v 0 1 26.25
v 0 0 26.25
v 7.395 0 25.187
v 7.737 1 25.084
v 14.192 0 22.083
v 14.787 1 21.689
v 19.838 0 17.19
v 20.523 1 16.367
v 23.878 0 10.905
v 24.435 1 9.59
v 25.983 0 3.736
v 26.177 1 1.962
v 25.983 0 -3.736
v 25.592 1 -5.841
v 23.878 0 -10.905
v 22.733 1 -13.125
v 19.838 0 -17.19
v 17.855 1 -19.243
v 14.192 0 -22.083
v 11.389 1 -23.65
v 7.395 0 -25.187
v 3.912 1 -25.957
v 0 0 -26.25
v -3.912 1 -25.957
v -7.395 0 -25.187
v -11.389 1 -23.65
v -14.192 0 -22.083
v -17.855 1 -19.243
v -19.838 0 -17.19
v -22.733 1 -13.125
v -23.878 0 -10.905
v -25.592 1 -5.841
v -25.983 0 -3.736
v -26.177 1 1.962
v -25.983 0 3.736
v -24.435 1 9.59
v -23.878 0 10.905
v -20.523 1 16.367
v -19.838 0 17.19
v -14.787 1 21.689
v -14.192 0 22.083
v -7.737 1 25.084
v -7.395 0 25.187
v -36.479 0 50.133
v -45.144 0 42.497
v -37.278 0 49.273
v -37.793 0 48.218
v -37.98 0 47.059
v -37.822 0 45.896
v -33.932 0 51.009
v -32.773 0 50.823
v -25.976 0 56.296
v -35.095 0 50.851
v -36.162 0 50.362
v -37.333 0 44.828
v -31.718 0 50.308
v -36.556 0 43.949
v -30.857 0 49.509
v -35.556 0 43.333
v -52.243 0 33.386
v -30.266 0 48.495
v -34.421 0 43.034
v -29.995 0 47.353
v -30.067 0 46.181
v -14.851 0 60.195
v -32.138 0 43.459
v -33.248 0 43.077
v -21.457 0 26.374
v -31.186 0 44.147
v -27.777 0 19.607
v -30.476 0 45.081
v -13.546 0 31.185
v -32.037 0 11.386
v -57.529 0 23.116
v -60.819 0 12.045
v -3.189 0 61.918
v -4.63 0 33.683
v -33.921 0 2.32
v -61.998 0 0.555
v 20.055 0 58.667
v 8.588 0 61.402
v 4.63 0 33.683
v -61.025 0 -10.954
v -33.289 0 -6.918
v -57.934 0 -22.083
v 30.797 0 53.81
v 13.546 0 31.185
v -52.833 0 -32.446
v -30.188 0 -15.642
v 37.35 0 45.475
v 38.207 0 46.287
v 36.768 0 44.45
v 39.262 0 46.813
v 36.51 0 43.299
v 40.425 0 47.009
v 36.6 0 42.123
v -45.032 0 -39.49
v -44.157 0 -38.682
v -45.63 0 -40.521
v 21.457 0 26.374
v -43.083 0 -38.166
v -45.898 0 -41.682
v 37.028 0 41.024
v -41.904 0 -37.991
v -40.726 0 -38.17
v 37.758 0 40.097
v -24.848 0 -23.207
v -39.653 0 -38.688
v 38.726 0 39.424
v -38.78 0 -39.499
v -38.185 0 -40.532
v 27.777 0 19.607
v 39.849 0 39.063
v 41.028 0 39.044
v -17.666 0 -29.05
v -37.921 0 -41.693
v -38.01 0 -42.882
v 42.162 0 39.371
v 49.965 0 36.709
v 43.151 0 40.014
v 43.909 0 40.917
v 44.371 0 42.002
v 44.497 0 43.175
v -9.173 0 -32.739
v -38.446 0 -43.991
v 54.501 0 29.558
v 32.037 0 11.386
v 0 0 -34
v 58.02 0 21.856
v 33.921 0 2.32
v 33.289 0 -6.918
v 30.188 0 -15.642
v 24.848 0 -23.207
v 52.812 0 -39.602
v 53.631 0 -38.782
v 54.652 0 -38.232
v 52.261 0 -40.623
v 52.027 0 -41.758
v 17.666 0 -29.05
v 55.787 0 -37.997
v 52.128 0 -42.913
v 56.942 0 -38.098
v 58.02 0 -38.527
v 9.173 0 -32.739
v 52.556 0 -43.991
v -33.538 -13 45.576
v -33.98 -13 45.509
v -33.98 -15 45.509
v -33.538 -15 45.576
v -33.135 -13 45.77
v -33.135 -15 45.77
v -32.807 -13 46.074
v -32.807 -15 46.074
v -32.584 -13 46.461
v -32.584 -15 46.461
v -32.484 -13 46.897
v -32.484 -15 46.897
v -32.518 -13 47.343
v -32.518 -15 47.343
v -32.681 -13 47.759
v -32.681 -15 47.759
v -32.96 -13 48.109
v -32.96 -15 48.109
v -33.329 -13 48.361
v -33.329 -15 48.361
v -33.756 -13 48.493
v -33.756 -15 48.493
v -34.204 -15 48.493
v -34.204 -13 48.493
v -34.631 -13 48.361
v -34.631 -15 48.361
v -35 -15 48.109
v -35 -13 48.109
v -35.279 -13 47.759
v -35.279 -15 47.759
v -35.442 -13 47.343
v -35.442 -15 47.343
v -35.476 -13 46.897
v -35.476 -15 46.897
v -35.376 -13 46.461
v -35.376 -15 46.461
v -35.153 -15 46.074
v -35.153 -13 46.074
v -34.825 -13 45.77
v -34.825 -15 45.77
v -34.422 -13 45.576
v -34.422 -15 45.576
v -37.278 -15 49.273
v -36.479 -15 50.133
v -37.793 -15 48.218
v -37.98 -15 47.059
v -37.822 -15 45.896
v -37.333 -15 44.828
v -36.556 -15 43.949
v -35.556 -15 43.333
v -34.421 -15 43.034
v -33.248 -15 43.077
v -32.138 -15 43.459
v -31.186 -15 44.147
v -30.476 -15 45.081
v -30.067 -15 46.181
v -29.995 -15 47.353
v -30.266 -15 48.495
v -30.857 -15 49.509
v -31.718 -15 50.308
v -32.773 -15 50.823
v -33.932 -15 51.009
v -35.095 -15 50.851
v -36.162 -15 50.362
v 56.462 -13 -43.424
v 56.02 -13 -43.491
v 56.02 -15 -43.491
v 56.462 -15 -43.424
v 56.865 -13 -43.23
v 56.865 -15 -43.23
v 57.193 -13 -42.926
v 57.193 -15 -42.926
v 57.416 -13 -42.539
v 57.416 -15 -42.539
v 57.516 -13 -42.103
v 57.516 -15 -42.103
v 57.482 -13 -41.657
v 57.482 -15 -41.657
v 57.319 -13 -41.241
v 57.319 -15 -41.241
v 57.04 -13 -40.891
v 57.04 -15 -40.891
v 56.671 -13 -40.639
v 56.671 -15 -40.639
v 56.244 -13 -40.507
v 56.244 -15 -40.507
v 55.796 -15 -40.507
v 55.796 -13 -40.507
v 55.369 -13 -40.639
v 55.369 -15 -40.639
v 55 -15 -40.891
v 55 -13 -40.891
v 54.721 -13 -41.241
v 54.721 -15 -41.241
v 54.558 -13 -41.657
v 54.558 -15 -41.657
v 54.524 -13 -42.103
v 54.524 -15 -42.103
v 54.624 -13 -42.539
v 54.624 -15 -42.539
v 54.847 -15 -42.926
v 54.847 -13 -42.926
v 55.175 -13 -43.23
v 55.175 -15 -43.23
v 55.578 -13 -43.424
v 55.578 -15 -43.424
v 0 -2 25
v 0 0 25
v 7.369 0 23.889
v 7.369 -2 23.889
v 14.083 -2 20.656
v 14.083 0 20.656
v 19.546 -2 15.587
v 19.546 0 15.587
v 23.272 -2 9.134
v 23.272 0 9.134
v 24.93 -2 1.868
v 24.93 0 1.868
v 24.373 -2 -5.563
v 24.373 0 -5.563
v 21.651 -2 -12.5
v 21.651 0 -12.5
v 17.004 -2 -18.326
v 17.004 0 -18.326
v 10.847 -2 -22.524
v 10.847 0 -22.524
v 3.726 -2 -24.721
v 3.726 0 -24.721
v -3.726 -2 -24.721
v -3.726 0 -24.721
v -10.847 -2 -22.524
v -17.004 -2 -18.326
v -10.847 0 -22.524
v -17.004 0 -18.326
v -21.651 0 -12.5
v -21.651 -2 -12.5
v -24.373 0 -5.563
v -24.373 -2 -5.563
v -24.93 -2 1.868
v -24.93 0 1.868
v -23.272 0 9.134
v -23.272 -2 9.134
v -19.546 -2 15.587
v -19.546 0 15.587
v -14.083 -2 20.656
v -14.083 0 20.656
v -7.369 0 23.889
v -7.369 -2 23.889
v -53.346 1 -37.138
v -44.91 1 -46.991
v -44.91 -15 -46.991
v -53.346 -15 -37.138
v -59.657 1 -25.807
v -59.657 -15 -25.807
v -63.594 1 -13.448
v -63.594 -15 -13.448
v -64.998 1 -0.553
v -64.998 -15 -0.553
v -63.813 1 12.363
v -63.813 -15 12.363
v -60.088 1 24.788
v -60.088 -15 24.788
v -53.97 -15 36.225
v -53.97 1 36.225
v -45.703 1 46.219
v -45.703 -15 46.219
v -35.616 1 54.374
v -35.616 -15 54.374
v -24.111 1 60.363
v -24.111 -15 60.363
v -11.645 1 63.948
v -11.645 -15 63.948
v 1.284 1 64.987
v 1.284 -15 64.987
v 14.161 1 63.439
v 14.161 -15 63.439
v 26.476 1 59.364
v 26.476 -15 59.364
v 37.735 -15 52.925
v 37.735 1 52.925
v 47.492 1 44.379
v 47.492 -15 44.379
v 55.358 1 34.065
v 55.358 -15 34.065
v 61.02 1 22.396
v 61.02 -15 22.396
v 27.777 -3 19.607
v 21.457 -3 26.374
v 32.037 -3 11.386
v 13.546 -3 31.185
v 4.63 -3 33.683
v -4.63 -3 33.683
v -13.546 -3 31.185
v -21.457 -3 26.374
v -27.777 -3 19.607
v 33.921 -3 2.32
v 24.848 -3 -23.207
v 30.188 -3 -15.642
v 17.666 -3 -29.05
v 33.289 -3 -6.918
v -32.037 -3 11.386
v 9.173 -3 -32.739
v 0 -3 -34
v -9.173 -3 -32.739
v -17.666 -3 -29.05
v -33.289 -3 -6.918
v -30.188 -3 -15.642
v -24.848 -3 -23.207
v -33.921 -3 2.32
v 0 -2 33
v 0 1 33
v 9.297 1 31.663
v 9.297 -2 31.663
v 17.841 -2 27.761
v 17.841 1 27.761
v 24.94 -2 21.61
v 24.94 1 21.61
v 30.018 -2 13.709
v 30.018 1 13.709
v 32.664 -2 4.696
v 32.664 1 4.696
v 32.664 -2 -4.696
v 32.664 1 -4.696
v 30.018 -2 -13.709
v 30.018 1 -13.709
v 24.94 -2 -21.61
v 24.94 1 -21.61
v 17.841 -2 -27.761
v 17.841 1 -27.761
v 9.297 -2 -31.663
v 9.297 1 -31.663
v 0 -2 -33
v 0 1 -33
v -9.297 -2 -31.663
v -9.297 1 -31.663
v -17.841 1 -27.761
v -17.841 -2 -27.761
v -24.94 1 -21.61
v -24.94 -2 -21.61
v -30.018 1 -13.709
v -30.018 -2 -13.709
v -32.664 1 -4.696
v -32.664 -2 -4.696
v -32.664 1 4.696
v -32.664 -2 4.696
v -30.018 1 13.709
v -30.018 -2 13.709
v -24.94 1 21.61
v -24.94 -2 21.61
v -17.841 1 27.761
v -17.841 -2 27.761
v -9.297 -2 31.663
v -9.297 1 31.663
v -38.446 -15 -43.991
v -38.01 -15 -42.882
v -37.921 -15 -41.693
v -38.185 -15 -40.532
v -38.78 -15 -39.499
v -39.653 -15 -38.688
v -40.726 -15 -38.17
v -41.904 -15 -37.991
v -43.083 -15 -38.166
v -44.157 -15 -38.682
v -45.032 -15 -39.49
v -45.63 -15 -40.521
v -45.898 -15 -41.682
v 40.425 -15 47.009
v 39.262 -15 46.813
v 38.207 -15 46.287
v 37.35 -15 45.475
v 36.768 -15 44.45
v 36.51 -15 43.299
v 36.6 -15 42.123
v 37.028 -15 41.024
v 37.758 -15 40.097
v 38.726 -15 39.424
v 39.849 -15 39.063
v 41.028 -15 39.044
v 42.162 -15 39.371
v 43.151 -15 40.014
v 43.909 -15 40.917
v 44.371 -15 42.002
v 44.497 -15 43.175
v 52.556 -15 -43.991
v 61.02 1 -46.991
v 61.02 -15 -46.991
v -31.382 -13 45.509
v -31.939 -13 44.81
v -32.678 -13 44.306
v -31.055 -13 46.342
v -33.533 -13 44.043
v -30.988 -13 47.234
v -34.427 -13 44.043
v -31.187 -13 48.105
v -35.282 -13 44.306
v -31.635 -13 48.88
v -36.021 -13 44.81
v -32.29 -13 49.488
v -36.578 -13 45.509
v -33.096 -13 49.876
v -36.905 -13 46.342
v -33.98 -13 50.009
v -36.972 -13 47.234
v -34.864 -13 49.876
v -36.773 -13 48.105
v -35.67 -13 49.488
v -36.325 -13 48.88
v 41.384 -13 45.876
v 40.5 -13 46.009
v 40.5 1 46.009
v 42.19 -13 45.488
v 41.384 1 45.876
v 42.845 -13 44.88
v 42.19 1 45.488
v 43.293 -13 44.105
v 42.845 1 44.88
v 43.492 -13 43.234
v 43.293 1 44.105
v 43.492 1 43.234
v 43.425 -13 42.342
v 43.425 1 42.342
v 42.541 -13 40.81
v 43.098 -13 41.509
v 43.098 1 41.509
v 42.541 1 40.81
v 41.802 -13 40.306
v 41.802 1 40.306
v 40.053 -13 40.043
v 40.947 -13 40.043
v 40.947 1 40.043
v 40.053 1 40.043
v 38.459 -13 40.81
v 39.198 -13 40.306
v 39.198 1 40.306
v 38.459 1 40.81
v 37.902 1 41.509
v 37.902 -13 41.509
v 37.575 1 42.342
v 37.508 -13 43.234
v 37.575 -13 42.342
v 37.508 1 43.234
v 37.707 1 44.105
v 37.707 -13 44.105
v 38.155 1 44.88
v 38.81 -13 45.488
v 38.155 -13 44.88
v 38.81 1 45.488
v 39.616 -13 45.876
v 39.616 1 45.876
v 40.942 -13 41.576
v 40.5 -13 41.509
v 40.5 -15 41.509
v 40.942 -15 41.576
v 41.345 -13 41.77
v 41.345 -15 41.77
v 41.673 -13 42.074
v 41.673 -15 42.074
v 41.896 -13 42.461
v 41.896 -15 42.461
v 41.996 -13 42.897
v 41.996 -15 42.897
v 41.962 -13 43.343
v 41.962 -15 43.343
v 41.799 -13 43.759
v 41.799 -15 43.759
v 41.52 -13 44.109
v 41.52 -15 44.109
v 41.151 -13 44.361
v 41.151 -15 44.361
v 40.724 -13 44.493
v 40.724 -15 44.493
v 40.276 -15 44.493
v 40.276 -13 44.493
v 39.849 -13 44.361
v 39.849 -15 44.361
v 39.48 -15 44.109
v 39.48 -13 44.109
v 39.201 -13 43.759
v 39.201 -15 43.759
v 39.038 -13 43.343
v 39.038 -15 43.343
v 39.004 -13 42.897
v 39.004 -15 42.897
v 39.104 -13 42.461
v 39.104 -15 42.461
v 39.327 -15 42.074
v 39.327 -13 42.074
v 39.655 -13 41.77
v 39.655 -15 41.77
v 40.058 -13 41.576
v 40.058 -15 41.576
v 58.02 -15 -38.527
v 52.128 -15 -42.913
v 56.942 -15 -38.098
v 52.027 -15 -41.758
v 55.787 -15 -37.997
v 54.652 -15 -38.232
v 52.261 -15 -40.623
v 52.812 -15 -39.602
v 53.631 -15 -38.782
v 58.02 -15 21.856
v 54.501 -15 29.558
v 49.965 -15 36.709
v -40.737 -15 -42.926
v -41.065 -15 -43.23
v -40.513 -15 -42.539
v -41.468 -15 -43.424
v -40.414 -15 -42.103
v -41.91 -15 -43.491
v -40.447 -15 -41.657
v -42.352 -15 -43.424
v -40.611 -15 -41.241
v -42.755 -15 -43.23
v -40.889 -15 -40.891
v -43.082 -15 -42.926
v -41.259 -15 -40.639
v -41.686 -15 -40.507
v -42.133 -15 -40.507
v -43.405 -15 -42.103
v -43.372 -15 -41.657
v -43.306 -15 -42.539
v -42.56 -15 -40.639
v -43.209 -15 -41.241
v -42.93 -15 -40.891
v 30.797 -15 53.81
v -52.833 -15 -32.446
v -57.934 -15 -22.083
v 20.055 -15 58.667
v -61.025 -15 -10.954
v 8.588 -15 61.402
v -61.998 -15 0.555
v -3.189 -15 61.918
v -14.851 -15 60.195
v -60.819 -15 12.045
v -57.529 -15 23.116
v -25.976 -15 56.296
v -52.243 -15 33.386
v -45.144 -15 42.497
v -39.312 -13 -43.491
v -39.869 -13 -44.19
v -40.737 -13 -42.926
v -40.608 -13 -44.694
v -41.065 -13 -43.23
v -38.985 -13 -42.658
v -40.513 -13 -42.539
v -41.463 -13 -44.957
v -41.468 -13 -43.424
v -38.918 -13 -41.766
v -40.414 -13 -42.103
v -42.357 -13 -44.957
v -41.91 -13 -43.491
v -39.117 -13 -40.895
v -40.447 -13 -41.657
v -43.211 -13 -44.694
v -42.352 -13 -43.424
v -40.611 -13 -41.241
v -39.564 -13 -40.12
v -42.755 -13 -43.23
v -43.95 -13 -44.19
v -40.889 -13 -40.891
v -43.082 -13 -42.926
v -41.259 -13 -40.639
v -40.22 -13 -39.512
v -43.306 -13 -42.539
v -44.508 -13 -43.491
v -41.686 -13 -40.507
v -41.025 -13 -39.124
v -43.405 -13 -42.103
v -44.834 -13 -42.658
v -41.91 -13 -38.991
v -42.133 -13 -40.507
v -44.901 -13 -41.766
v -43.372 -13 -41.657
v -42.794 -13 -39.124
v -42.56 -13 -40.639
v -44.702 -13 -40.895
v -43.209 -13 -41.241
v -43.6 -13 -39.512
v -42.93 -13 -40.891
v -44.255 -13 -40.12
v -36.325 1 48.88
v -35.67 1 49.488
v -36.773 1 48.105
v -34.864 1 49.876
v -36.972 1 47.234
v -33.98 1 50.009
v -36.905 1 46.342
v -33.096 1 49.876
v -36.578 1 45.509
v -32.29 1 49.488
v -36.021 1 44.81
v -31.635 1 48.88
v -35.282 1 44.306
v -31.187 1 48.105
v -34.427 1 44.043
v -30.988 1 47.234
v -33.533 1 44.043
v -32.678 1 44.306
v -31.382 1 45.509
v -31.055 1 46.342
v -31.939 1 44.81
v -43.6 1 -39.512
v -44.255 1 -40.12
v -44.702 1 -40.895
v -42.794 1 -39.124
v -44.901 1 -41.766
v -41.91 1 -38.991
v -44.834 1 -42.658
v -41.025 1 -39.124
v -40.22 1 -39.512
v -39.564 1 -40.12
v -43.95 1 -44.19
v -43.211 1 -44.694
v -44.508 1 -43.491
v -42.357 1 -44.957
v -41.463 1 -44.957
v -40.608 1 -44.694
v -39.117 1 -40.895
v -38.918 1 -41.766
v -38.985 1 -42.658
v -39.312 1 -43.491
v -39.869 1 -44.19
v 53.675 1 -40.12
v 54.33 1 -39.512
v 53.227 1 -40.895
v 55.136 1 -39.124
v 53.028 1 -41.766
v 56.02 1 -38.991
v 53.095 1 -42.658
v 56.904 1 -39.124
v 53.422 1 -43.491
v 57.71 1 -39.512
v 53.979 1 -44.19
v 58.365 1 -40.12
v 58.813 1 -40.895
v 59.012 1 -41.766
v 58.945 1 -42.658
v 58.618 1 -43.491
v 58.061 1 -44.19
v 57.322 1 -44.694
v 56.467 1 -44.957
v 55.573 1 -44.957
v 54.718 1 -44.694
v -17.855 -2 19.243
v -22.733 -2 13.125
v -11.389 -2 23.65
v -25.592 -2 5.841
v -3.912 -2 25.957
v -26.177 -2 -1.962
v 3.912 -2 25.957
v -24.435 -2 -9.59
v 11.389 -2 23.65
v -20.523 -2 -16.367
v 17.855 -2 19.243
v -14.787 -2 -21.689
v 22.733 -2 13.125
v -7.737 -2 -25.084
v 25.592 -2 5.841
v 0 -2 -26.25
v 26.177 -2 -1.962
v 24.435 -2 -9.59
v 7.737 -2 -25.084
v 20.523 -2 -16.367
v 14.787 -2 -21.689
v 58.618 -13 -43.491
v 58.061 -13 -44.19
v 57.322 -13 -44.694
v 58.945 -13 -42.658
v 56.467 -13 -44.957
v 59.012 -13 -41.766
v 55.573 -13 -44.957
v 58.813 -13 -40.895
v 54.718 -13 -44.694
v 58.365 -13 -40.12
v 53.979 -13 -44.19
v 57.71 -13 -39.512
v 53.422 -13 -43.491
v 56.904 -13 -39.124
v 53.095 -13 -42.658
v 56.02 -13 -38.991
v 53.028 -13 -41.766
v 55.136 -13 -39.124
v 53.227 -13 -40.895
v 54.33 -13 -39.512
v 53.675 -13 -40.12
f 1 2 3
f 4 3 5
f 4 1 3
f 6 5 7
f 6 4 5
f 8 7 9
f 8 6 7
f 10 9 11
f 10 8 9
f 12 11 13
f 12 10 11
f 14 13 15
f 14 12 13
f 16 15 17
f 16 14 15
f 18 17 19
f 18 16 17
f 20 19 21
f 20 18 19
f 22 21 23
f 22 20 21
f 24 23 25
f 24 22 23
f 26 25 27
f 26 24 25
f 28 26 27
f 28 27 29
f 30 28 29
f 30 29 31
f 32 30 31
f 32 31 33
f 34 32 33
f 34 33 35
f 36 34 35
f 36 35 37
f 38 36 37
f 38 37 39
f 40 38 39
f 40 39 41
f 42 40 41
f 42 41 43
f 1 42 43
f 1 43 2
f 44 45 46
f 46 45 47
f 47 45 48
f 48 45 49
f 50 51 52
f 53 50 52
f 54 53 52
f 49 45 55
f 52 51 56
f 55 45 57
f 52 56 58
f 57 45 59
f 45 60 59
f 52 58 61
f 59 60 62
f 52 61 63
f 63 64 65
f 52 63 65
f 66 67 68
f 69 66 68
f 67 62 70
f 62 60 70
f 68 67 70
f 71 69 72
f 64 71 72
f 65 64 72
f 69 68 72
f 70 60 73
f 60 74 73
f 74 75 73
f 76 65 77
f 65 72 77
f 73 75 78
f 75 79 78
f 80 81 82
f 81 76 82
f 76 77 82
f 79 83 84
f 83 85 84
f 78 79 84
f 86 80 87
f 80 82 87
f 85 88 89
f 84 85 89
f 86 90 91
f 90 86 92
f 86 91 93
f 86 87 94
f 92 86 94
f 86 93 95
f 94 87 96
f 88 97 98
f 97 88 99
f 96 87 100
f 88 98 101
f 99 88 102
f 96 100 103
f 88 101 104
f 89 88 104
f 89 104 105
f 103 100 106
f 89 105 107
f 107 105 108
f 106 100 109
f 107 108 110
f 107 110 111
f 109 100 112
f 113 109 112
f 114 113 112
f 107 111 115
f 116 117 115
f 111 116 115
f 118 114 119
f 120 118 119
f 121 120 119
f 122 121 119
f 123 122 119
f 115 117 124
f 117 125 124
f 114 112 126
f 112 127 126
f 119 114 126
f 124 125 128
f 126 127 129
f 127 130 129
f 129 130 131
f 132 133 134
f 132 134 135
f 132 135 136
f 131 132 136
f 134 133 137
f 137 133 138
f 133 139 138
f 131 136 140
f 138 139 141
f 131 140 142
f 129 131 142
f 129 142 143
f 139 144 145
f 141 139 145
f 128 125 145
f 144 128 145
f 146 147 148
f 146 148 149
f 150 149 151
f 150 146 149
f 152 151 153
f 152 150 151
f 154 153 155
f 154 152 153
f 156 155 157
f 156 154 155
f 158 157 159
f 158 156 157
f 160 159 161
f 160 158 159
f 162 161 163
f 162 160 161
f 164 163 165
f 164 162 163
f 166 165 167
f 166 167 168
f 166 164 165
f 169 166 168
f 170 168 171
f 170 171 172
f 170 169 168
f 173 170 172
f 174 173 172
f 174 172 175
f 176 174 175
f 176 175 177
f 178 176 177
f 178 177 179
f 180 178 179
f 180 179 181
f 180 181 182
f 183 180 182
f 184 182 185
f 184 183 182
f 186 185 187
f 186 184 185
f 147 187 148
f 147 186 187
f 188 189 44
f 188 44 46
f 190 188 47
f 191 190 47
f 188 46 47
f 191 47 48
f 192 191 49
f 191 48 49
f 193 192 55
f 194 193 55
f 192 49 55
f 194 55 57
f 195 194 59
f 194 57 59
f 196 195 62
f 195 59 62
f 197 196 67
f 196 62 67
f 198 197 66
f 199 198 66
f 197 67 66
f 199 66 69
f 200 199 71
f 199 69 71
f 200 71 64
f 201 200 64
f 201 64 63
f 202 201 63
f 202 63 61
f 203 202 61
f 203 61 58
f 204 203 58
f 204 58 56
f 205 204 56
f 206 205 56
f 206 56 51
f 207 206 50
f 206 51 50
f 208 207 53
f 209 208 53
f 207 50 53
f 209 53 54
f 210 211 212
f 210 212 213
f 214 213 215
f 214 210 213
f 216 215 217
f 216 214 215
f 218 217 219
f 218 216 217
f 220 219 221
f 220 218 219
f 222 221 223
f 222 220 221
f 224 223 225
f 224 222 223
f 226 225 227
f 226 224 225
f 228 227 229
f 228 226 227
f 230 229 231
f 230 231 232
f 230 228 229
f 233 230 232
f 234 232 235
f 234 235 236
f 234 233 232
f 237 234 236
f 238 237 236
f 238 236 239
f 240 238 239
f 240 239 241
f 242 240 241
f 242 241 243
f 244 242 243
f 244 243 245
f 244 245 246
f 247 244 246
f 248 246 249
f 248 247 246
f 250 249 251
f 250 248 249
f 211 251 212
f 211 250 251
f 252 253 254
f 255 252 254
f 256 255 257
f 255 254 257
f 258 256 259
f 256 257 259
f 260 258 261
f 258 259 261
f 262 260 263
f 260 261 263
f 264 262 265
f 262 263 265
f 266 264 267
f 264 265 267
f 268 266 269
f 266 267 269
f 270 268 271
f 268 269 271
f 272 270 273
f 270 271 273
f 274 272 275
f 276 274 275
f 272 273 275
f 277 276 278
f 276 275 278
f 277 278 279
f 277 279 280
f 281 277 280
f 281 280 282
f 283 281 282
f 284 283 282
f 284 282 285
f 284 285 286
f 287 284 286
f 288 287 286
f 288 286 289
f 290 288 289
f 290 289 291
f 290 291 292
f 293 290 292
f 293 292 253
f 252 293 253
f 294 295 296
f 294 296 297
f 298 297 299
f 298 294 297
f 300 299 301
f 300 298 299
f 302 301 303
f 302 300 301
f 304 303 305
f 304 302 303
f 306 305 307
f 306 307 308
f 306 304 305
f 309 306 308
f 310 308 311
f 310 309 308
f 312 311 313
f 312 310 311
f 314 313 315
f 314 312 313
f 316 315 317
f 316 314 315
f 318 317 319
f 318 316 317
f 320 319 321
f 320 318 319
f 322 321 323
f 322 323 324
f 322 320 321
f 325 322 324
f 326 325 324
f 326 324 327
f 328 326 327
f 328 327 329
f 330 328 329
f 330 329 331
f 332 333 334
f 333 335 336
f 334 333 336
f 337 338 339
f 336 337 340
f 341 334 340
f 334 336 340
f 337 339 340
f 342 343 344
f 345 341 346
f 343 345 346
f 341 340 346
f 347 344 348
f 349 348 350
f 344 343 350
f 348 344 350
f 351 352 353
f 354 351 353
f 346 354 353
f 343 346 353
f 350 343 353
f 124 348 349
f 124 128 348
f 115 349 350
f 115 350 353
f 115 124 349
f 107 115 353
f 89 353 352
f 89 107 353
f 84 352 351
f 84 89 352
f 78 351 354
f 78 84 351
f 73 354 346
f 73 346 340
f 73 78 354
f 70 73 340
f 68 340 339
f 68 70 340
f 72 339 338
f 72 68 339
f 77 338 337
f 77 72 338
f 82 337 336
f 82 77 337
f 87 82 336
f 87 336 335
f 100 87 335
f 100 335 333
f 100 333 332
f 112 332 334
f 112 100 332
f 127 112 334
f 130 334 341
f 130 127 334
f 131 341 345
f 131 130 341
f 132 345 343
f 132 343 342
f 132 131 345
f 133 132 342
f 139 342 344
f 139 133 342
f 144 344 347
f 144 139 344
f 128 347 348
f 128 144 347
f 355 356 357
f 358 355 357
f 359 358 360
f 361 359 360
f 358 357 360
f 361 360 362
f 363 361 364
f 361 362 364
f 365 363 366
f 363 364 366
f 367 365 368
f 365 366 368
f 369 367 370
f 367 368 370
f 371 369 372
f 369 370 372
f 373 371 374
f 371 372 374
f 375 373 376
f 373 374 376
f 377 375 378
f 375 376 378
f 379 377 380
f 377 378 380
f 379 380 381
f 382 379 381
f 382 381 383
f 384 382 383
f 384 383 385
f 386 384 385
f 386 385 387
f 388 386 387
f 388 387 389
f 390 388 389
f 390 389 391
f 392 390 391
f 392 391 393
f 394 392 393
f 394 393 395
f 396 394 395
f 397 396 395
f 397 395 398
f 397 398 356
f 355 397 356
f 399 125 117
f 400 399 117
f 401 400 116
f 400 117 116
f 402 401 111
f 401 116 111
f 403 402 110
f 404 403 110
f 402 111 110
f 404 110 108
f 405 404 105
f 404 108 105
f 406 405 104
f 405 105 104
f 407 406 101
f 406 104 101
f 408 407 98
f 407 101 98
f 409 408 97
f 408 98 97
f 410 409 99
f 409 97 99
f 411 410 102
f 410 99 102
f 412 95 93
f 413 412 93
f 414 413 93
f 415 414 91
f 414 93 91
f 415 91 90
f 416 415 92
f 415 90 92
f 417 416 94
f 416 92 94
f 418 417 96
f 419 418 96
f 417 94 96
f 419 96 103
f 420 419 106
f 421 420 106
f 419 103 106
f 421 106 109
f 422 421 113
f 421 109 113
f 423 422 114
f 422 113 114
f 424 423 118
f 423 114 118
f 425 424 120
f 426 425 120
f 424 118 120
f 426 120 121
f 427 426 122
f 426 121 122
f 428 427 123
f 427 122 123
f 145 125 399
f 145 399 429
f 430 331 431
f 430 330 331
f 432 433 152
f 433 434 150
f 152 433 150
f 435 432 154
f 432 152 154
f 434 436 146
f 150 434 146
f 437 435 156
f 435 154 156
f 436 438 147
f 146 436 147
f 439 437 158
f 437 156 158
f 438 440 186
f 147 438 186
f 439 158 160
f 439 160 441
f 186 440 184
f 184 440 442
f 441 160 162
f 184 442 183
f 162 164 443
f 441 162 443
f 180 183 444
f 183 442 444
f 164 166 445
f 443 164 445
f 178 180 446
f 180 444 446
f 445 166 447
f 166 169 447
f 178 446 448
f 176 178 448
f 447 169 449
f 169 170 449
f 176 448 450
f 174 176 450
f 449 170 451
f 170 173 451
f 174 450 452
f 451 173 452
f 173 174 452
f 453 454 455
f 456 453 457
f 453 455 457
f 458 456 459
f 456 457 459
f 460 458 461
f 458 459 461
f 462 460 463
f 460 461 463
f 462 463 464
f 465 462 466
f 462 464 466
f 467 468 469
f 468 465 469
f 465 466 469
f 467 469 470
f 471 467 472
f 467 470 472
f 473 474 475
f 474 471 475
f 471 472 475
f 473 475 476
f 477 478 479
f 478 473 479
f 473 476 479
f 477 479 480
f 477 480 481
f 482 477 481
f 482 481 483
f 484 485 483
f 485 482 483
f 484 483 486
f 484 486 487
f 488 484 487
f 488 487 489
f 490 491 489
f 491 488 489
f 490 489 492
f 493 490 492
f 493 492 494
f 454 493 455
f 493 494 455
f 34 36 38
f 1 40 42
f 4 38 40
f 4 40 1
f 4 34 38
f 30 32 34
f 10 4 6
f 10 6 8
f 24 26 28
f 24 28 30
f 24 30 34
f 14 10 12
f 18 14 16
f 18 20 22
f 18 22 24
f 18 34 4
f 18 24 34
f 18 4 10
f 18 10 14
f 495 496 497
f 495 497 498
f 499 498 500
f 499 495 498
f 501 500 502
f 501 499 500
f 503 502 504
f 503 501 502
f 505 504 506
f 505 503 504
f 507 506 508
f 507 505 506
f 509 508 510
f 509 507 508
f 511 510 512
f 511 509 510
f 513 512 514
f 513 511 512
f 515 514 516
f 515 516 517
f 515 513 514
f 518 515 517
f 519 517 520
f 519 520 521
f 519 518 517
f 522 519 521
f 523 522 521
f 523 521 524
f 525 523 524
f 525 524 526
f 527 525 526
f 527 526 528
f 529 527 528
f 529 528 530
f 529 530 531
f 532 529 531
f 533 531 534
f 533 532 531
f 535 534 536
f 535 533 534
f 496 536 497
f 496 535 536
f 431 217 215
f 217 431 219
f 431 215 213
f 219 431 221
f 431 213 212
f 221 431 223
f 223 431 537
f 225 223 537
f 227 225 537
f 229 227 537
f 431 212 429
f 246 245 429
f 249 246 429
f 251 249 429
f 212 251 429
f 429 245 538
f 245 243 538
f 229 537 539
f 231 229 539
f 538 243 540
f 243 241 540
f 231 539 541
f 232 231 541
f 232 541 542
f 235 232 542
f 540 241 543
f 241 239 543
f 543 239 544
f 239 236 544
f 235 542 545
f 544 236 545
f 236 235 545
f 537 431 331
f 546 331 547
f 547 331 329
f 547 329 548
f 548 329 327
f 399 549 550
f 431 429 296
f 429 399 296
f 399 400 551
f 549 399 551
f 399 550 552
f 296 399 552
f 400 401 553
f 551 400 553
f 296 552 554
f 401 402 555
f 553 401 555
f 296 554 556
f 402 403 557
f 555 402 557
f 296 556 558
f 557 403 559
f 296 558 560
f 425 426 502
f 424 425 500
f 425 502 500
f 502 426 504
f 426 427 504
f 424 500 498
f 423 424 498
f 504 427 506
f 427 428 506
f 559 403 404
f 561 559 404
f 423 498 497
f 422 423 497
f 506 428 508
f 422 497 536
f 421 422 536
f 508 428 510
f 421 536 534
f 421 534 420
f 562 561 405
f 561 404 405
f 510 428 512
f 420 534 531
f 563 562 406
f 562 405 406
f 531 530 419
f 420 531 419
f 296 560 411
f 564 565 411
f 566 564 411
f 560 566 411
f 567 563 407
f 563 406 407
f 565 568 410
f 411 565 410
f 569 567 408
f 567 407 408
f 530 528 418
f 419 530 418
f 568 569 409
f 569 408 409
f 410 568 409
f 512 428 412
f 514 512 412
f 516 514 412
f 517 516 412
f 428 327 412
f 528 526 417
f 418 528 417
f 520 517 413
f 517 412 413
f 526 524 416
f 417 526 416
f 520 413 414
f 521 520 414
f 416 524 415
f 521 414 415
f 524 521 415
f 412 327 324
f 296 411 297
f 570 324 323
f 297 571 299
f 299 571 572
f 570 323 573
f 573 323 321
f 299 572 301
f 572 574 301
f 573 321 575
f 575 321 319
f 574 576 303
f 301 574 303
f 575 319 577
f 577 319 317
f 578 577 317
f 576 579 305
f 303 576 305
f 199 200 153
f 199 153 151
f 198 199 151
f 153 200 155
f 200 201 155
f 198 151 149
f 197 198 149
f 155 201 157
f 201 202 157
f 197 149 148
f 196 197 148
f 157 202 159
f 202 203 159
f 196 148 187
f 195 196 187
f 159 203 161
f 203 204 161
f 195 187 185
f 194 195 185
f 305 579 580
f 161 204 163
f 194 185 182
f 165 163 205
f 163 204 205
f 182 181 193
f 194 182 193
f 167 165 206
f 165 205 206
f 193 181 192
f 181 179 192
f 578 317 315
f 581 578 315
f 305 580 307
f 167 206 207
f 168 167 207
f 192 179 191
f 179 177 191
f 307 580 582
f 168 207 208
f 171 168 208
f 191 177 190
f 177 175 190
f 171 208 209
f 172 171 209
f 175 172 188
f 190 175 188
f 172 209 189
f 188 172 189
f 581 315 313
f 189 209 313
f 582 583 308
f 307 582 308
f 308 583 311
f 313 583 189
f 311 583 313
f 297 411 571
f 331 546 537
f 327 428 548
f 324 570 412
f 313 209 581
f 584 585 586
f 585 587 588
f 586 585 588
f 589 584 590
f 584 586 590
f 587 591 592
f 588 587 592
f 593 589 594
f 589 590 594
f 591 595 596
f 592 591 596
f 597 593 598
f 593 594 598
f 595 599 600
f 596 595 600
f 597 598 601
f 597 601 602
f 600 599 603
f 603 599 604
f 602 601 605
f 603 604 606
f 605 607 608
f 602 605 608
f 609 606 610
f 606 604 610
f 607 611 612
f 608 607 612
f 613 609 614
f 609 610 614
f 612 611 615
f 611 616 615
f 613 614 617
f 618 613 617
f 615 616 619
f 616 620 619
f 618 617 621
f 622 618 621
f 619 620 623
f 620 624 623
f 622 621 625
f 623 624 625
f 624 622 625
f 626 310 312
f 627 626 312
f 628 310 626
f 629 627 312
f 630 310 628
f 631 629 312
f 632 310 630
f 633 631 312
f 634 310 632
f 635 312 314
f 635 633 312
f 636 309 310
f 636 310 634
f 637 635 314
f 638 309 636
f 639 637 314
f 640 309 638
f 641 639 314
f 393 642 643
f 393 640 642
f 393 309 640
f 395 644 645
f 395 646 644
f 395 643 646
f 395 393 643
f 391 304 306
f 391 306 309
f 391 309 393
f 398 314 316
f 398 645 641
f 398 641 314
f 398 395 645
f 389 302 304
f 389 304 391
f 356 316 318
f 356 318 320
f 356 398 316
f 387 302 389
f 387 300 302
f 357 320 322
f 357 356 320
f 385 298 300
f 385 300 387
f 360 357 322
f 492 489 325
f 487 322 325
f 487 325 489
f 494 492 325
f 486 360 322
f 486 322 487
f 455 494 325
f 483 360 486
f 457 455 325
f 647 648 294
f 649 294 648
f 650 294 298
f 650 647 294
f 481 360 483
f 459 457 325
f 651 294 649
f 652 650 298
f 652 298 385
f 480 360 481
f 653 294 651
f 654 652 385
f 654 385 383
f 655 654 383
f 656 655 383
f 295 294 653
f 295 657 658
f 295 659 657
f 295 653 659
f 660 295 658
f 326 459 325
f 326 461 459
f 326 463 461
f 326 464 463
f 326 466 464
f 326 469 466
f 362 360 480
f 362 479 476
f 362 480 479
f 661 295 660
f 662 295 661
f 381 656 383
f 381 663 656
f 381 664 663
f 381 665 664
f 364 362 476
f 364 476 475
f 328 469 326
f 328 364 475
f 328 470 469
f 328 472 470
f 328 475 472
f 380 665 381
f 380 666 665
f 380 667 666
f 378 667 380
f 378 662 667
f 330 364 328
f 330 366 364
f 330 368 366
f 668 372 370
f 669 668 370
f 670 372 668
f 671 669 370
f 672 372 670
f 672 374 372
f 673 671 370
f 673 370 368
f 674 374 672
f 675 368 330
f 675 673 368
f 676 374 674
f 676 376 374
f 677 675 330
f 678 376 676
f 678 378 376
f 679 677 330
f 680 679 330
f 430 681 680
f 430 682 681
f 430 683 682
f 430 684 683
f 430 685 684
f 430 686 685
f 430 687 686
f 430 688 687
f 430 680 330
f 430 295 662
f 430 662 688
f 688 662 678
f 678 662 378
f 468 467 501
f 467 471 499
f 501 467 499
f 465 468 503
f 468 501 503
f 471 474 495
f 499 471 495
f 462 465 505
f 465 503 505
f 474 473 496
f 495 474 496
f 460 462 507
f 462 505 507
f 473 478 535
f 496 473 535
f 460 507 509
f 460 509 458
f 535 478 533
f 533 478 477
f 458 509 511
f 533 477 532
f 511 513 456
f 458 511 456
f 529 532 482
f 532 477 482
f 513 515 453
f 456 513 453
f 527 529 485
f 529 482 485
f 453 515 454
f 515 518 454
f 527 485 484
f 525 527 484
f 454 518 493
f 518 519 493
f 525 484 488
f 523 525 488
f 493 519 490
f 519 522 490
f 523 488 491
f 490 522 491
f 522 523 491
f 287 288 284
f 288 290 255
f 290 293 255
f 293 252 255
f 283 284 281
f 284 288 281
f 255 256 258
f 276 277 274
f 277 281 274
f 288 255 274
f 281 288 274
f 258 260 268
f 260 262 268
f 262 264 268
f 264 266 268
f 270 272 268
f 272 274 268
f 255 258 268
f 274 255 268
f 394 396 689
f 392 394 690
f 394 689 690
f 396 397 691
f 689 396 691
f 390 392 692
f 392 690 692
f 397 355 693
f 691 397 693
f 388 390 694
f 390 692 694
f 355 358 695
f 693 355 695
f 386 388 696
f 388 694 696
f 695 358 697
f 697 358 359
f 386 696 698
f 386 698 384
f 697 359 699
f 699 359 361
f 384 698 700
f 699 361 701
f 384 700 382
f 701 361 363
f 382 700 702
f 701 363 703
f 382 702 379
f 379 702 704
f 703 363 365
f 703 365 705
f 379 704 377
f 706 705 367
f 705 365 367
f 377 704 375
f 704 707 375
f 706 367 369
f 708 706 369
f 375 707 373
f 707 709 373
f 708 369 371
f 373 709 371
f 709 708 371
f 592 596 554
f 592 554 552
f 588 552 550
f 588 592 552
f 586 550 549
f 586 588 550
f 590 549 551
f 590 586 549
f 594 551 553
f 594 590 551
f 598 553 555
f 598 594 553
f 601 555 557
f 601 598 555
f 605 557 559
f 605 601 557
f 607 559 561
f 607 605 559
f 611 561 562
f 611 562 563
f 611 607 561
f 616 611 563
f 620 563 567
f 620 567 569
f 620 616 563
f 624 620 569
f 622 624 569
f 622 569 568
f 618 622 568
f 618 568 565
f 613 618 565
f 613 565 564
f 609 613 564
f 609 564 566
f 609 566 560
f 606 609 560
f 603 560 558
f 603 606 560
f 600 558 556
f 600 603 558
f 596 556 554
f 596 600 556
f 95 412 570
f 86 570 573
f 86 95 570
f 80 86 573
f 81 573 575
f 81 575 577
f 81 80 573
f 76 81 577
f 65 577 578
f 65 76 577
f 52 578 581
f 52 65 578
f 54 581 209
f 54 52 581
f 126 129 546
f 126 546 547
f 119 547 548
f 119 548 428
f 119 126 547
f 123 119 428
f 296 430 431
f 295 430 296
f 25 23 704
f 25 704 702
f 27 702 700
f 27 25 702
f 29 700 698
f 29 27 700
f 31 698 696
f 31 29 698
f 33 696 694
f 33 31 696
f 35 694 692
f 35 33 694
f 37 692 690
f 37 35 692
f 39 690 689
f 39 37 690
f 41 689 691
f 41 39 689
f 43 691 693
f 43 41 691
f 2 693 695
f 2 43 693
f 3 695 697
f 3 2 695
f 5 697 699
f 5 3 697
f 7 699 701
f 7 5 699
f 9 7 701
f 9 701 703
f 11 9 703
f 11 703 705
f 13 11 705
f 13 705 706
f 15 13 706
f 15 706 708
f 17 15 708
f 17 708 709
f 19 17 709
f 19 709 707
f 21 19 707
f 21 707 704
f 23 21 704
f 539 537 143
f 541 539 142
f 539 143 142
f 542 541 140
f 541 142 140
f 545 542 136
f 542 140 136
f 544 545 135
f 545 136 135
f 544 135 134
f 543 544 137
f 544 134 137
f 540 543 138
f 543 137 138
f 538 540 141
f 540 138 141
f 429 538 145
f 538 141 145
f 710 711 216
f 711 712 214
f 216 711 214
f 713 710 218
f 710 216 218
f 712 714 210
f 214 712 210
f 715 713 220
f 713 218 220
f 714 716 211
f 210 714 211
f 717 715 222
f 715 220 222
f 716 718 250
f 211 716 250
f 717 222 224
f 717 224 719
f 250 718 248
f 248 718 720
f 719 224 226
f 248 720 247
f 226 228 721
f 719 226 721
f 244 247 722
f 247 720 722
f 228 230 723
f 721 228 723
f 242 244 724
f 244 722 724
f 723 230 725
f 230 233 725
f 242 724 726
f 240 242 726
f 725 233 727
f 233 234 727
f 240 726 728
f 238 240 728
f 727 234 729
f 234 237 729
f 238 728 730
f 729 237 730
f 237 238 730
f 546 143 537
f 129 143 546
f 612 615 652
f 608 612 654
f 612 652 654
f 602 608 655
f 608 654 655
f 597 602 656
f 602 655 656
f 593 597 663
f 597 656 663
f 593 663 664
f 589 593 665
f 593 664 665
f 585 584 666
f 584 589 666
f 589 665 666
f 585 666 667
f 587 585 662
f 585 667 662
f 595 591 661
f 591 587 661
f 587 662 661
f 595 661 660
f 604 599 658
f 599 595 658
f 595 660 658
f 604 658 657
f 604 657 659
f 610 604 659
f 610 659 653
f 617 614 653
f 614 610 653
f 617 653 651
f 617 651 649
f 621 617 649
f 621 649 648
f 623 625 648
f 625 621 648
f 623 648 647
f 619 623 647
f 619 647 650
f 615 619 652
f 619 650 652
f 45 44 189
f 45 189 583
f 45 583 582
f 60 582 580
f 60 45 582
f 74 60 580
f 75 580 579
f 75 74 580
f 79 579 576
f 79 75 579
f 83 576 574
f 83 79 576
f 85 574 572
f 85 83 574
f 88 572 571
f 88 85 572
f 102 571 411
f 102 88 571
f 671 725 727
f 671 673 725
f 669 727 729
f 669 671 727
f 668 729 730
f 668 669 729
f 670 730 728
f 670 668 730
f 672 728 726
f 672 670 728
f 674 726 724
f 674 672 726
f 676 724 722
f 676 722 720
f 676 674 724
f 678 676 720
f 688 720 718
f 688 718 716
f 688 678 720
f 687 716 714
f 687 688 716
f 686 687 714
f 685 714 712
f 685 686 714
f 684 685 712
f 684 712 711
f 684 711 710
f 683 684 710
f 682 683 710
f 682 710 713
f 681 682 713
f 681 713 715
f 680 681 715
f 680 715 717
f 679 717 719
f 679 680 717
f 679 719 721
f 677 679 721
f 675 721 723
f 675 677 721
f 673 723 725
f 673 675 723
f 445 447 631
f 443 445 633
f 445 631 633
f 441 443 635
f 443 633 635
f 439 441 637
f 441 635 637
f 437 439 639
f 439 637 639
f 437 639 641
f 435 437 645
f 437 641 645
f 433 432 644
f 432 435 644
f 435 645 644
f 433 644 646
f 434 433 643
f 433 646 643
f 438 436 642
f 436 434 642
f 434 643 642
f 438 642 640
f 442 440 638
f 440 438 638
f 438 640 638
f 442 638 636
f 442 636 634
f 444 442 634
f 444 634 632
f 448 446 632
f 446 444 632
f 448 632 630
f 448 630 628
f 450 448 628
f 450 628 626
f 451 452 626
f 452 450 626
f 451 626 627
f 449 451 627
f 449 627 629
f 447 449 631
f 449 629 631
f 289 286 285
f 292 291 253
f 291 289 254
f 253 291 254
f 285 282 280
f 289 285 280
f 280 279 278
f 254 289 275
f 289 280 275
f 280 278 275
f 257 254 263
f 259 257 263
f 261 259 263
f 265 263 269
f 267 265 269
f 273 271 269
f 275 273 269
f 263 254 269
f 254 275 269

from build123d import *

# Parameters (mm, degrees)
BOSS_EXTRUDE1_DEPTH = 1
CUT_EXTRUDE1_REACH  = 93.929
SKETCH2_R           = 3
SKETCH3_R           = 4
SKETCH3_R_2         = 3
BOSS_EXTRUDE2_DEPTH = 15
BOSS_EXTRUDE3_START = -2
SKETCH4_R           = 3
SKETCH4_R_2         = 1.5
BOSS_EXTRUDE3_DEPTH = 2
BOSS_EXTRUDE4_DEPTH = 15
SKETCH8_R           = 34
SKETCH8_R_2         = 33
SKETCH8_R_3         = 26.25
SKETCH8_R_4         = 25
BOSS_EXTRUDE5_DEPTH = 3
BOSS_EXTRUDE6_START = -1
SKETCH9_R           = 34
BOSS_EXTRUDE6_DEPTH = 1
SKETCH10_R          = 33
SKETCH10_R_2        = 26.25
CUT_EXTRUDE6_DEPTH  = 1


with BuildPart() as part:
    # Sketch1 → Boss-Extrude1 (new body)
    with BuildSketch(Plane(origin=(0, 0, 0), x_dir=(1, 0, 0), z_dir=(0, 1, 0))):
        with BuildLine():
            Line((61.02, 46.990674783), (-44.909648, 46.990674783))
            ThreePointArc((-44.909648, 46.990674783), (-35.615966741, -54.373733669), (61.02, -22.395526339))
            Line((61.02, -22.395526339), (61.02, 46.990674783))
        make_face()
    extrude(amount=BOSS_EXTRUDE1_DEPTH)

    # Sketch2 → Cut-Extrude1 (cut, up to next)
    with BuildSketch(Plane(origin=(0, 1, 0), x_dir=(1, 0, 0), z_dir=(0, 1, 0)), mode=Mode.PRIVATE) as cut_extrude1_sk1:
        with Locations(Location((-41.909648, 41.990674783, 0), (0, 0, 270))):
            Circle(SKETCH2_R)
    cut_extrude1_tool1 = extrude(cut_extrude1_sk1.sketch, amount=-CUT_EXTRUDE1_REACH, mode=Mode.PRIVATE) & part.part
    # Sketch2 → Cut-Extrude1 (cut, up to next)
    with BuildSketch(Plane(origin=(0, 1, 0), x_dir=(1, 0, 0), z_dir=(0, 1, 0)), mode=Mode.PRIVATE) as cut_extrude1_sk2:
        with Locations(Location((56.02, 41.990674783, 0), (0, 0, 270))):
            Circle(SKETCH2_R)
    cut_extrude1_tool2 = extrude(cut_extrude1_sk2.sketch, amount=-CUT_EXTRUDE1_REACH, mode=Mode.PRIVATE) & part.part
    # Sketch2 → Cut-Extrude1 (cut, up to next)
    with BuildSketch(Plane(origin=(0, 1, 0), x_dir=(1, 0, 0), z_dir=(0, 1, 0)), mode=Mode.PRIVATE) as cut_extrude1_sk3:
        with Locations(Location((40.5, -43.009325217, 0), (0, 0, 270))):
            Circle(SKETCH2_R)
    cut_extrude1_tool3 = extrude(cut_extrude1_sk3.sketch, amount=-CUT_EXTRUDE1_REACH, mode=Mode.PRIVATE) & part.part
    # Sketch2 → Cut-Extrude1 (cut, up to next)
    with BuildSketch(Plane(origin=(0, 1, 0), x_dir=(1, 0, 0), z_dir=(0, 1, 0)), mode=Mode.PRIVATE) as cut_extrude1_sk4:
        with Locations(Location((-33.98, -47.009325217, 0), (0, 0, 270))):
            Circle(SKETCH2_R)
    cut_extrude1_tool4 = extrude(cut_extrude1_sk4.sketch, amount=-CUT_EXTRUDE1_REACH, mode=Mode.PRIVATE) & part.part
    add(cut_extrude1_tool1.solids().sort_by_distance((-41.909648, 1, -41.990675))[0], mode=Mode.SUBTRACT)
    add(cut_extrude1_tool2.solids().sort_by_distance((56.02, 1, -41.990675))[0], mode=Mode.SUBTRACT)
    add(cut_extrude1_tool3.solids().sort_by_distance((40.5, 1, 43.009325))[0], mode=Mode.SUBTRACT)
    add(cut_extrude1_tool4.solids().sort_by_distance((-33.98, 1, 47.009325))[0], mode=Mode.SUBTRACT)

    # Sketch3 → Boss-Extrude2 (add)
    # profile 1 of 4: a face of its own
    with BuildSketch(Plane.XZ):
        with Locations(Location((56.02, -41.990674783, 0), (0, 0, 90))):
            Circle(SKETCH3_R)
        with Locations(Location((56.02, -41.990674783, 0), (0, 0, 90))):
            Circle(SKETCH3_R_2, mode=Mode.SUBTRACT)
    # profile 2 of 4: a face of its own
    with BuildSketch(Plane.XZ):
        with Locations(Location((-41.909648, -41.990674783, 0), (0, 0, 90))):
            Circle(SKETCH3_R)
        with Locations(Location((-41.909648, -41.990674783, 0), (0, 0, 90))):
            Circle(SKETCH3_R_2, mode=Mode.SUBTRACT)
    # profile 3 of 4: a face of its own
    with BuildSketch(Plane.XZ):
        with Locations(Location((40.5, 43.009325217, 0), (0, 0, 90))):
            Circle(SKETCH3_R)
        with Locations(Location((40.5, 43.009325217, 0), (0, 0, 90))):
            Circle(SKETCH3_R_2, mode=Mode.SUBTRACT)
    # profile 4 of 4: a face of its own
    with BuildSketch(Plane.XZ):
        with Locations(Location((-33.98, 47.009325217, 0), (0, 0, 90))):
            Circle(SKETCH3_R)
        with Locations(Location((-33.98, 47.009325217, 0), (0, 0, 90))):
            Circle(SKETCH3_R_2, mode=Mode.SUBTRACT)
    extrude(amount=BOSS_EXTRUDE2_DEPTH)

    # Sketch4 → Boss-Extrude3 (add)
    # profile 1 of 4: a face of its own
    with BuildSketch(Plane.XZ.offset(15).offset(BOSS_EXTRUDE3_START)):
        with Locations(Location((56.02, -41.990674783, 0), (0, 0, 90))):
            Circle(SKETCH4_R)
        with Locations(Location((56.02, -41.990674783, 0), (0, 0, 270))):
            Circle(SKETCH4_R_2, mode=Mode.SUBTRACT)
    # profile 2 of 4: a face of its own
    with BuildSketch(Plane.XZ.offset(15).offset(BOSS_EXTRUDE3_START)):
        with Locations(Location((-41.909648, -41.990674783, 0), (0, 0, 90))):
            Circle(SKETCH4_R)
        with Locations(Location((-41.909648, -41.990674783, 0), (0, 0, 270))):
            Circle(SKETCH4_R_2, mode=Mode.SUBTRACT)
    # profile 3 of 4: a face of its own
    with BuildSketch(Plane.XZ.offset(15).offset(BOSS_EXTRUDE3_START)):
        with Locations(Location((-33.98, 47.009325217, 0), (0, 0, 90))):
            Circle(SKETCH4_R)
        with Locations(Location((-33.98, 47.009325217, 0), (0, 0, 270))):
            Circle(SKETCH4_R_2, mode=Mode.SUBTRACT)
    # profile 4 of 4: a face of its own
    with BuildSketch(Plane.XZ.offset(15).offset(BOSS_EXTRUDE3_START)):
        with Locations(Location((40.5, 43.009325217, 0), (0, 0, 90))):
            Circle(SKETCH4_R)
        with Locations(Location((40.5, 43.009325217, 0), (0, 0, 270))):
            Circle(SKETCH4_R_2, mode=Mode.SUBTRACT)
    extrude(amount=BOSS_EXTRUDE3_DEPTH)

    # Sketch5 → Boss-Extrude4 (add)
    with BuildSketch(Plane.XZ):
        with BuildLine():
            Line((61.02, -46.990674783), (-44.909648, -46.990674783))
            ThreePointArc((-44.909648, -46.990674783), (-35.615966741, 54.373733669), (61.02, 22.395526339))
            Line((61.02, 22.395526339), (61.02, -46.990674783))
        make_face()
        with BuildLine():
            Line((-38.445546385, -43.990674783), (52.555898385, -43.990674783))
            ThreePointArc((52.555898385, -43.990674783), (58.848427125, -44.819101907), (58.02, -38.526573168))
            Line((58.02, -38.526573168), (58.02, 21.855882503))
            ThreePointArc((58.02, 21.855882503), (52.354897092, 33.210913123), (44.496580109, 43.174695814))
            ThreePointArc((44.496580109, 43.174695814), (43.242199594, 45.921427789), (40.425106883, 47.008624034))
            ThreePointArc((40.425106883, 47.008624034), (2.711724037, 61.940669618), (-36.162300139, 50.361573136))
            ThreePointArc((-36.162300139, 50.361573136), (-36.323268199, 50.25109852), (-36.478654103, 50.132901321))
            ThreePointArc((-36.478654103, 50.132901321), (-61.676302569, 6.327219087), (-45.897728888, -41.682112265))
            ThreePointArc((-45.897728888, -41.682112265), (-43.093288061, -45.811538063), (-38.445546385, -43.990674783))
        make_face(mode=Mode.SUBTRACT)
    extrude(amount=BOSS_EXTRUDE4_DEPTH)

    # Sketch8 → Boss-Extrude5 (add)
    # profile 1 of 2: a face of its own
    with BuildSketch(Plane(origin=(0, 0, 0), x_dir=(1, 0, 0), z_dir=(0, 1, 0))):
        with Locations(Location((0, 0, 0), (0, 0, 90))):
            Circle(SKETCH8_R)
        with Locations(Location((0, 0, 0), (0, 0, 270))):
            Circle(SKETCH8_R_2, mode=Mode.SUBTRACT)
    # profile 2 of 2: a face of its own
    with BuildSketch(Plane(origin=(0, 0, 0), x_dir=(1, 0, 0), z_dir=(0, 1, 0))):
        with Locations(Location((0, 0, 0), (0, 0, 90))):
            Circle(SKETCH8_R_3)
        with Locations(Location((0, 0, 0), (0, 0, 270))):
            Circle(SKETCH8_R_4, mode=Mode.SUBTRACT)
    extrude(amount=-BOSS_EXTRUDE5_DEPTH)

    # Sketch9 → Boss-Extrude6 (add)
    with BuildSketch(Plane.XZ.offset(3).offset(BOSS_EXTRUDE6_START)):
        with Locations(Location((0, 0, 0), (0, 0, 270))):
            Circle(SKETCH9_R)
    extrude(amount=BOSS_EXTRUDE6_DEPTH)

    # Sketch10 → Cut-Extrude6 (cut)
    with BuildSketch(Plane(origin=(0, 1, 0), x_dir=(1, 0, 0), z_dir=(0, 1, 0))):
        with Locations(Location((0, 0, 0), (0, 0, 270))):
            Circle(SKETCH10_R)
        with Locations(Location((0, 0, 0), (0, 0, 270))):
            Circle(SKETCH10_R_2, mode=Mode.SUBTRACT)
    extrude(amount=-CUT_EXTRUDE6_DEPTH, mode=Mode.SUBTRACT)


solid = part.part
